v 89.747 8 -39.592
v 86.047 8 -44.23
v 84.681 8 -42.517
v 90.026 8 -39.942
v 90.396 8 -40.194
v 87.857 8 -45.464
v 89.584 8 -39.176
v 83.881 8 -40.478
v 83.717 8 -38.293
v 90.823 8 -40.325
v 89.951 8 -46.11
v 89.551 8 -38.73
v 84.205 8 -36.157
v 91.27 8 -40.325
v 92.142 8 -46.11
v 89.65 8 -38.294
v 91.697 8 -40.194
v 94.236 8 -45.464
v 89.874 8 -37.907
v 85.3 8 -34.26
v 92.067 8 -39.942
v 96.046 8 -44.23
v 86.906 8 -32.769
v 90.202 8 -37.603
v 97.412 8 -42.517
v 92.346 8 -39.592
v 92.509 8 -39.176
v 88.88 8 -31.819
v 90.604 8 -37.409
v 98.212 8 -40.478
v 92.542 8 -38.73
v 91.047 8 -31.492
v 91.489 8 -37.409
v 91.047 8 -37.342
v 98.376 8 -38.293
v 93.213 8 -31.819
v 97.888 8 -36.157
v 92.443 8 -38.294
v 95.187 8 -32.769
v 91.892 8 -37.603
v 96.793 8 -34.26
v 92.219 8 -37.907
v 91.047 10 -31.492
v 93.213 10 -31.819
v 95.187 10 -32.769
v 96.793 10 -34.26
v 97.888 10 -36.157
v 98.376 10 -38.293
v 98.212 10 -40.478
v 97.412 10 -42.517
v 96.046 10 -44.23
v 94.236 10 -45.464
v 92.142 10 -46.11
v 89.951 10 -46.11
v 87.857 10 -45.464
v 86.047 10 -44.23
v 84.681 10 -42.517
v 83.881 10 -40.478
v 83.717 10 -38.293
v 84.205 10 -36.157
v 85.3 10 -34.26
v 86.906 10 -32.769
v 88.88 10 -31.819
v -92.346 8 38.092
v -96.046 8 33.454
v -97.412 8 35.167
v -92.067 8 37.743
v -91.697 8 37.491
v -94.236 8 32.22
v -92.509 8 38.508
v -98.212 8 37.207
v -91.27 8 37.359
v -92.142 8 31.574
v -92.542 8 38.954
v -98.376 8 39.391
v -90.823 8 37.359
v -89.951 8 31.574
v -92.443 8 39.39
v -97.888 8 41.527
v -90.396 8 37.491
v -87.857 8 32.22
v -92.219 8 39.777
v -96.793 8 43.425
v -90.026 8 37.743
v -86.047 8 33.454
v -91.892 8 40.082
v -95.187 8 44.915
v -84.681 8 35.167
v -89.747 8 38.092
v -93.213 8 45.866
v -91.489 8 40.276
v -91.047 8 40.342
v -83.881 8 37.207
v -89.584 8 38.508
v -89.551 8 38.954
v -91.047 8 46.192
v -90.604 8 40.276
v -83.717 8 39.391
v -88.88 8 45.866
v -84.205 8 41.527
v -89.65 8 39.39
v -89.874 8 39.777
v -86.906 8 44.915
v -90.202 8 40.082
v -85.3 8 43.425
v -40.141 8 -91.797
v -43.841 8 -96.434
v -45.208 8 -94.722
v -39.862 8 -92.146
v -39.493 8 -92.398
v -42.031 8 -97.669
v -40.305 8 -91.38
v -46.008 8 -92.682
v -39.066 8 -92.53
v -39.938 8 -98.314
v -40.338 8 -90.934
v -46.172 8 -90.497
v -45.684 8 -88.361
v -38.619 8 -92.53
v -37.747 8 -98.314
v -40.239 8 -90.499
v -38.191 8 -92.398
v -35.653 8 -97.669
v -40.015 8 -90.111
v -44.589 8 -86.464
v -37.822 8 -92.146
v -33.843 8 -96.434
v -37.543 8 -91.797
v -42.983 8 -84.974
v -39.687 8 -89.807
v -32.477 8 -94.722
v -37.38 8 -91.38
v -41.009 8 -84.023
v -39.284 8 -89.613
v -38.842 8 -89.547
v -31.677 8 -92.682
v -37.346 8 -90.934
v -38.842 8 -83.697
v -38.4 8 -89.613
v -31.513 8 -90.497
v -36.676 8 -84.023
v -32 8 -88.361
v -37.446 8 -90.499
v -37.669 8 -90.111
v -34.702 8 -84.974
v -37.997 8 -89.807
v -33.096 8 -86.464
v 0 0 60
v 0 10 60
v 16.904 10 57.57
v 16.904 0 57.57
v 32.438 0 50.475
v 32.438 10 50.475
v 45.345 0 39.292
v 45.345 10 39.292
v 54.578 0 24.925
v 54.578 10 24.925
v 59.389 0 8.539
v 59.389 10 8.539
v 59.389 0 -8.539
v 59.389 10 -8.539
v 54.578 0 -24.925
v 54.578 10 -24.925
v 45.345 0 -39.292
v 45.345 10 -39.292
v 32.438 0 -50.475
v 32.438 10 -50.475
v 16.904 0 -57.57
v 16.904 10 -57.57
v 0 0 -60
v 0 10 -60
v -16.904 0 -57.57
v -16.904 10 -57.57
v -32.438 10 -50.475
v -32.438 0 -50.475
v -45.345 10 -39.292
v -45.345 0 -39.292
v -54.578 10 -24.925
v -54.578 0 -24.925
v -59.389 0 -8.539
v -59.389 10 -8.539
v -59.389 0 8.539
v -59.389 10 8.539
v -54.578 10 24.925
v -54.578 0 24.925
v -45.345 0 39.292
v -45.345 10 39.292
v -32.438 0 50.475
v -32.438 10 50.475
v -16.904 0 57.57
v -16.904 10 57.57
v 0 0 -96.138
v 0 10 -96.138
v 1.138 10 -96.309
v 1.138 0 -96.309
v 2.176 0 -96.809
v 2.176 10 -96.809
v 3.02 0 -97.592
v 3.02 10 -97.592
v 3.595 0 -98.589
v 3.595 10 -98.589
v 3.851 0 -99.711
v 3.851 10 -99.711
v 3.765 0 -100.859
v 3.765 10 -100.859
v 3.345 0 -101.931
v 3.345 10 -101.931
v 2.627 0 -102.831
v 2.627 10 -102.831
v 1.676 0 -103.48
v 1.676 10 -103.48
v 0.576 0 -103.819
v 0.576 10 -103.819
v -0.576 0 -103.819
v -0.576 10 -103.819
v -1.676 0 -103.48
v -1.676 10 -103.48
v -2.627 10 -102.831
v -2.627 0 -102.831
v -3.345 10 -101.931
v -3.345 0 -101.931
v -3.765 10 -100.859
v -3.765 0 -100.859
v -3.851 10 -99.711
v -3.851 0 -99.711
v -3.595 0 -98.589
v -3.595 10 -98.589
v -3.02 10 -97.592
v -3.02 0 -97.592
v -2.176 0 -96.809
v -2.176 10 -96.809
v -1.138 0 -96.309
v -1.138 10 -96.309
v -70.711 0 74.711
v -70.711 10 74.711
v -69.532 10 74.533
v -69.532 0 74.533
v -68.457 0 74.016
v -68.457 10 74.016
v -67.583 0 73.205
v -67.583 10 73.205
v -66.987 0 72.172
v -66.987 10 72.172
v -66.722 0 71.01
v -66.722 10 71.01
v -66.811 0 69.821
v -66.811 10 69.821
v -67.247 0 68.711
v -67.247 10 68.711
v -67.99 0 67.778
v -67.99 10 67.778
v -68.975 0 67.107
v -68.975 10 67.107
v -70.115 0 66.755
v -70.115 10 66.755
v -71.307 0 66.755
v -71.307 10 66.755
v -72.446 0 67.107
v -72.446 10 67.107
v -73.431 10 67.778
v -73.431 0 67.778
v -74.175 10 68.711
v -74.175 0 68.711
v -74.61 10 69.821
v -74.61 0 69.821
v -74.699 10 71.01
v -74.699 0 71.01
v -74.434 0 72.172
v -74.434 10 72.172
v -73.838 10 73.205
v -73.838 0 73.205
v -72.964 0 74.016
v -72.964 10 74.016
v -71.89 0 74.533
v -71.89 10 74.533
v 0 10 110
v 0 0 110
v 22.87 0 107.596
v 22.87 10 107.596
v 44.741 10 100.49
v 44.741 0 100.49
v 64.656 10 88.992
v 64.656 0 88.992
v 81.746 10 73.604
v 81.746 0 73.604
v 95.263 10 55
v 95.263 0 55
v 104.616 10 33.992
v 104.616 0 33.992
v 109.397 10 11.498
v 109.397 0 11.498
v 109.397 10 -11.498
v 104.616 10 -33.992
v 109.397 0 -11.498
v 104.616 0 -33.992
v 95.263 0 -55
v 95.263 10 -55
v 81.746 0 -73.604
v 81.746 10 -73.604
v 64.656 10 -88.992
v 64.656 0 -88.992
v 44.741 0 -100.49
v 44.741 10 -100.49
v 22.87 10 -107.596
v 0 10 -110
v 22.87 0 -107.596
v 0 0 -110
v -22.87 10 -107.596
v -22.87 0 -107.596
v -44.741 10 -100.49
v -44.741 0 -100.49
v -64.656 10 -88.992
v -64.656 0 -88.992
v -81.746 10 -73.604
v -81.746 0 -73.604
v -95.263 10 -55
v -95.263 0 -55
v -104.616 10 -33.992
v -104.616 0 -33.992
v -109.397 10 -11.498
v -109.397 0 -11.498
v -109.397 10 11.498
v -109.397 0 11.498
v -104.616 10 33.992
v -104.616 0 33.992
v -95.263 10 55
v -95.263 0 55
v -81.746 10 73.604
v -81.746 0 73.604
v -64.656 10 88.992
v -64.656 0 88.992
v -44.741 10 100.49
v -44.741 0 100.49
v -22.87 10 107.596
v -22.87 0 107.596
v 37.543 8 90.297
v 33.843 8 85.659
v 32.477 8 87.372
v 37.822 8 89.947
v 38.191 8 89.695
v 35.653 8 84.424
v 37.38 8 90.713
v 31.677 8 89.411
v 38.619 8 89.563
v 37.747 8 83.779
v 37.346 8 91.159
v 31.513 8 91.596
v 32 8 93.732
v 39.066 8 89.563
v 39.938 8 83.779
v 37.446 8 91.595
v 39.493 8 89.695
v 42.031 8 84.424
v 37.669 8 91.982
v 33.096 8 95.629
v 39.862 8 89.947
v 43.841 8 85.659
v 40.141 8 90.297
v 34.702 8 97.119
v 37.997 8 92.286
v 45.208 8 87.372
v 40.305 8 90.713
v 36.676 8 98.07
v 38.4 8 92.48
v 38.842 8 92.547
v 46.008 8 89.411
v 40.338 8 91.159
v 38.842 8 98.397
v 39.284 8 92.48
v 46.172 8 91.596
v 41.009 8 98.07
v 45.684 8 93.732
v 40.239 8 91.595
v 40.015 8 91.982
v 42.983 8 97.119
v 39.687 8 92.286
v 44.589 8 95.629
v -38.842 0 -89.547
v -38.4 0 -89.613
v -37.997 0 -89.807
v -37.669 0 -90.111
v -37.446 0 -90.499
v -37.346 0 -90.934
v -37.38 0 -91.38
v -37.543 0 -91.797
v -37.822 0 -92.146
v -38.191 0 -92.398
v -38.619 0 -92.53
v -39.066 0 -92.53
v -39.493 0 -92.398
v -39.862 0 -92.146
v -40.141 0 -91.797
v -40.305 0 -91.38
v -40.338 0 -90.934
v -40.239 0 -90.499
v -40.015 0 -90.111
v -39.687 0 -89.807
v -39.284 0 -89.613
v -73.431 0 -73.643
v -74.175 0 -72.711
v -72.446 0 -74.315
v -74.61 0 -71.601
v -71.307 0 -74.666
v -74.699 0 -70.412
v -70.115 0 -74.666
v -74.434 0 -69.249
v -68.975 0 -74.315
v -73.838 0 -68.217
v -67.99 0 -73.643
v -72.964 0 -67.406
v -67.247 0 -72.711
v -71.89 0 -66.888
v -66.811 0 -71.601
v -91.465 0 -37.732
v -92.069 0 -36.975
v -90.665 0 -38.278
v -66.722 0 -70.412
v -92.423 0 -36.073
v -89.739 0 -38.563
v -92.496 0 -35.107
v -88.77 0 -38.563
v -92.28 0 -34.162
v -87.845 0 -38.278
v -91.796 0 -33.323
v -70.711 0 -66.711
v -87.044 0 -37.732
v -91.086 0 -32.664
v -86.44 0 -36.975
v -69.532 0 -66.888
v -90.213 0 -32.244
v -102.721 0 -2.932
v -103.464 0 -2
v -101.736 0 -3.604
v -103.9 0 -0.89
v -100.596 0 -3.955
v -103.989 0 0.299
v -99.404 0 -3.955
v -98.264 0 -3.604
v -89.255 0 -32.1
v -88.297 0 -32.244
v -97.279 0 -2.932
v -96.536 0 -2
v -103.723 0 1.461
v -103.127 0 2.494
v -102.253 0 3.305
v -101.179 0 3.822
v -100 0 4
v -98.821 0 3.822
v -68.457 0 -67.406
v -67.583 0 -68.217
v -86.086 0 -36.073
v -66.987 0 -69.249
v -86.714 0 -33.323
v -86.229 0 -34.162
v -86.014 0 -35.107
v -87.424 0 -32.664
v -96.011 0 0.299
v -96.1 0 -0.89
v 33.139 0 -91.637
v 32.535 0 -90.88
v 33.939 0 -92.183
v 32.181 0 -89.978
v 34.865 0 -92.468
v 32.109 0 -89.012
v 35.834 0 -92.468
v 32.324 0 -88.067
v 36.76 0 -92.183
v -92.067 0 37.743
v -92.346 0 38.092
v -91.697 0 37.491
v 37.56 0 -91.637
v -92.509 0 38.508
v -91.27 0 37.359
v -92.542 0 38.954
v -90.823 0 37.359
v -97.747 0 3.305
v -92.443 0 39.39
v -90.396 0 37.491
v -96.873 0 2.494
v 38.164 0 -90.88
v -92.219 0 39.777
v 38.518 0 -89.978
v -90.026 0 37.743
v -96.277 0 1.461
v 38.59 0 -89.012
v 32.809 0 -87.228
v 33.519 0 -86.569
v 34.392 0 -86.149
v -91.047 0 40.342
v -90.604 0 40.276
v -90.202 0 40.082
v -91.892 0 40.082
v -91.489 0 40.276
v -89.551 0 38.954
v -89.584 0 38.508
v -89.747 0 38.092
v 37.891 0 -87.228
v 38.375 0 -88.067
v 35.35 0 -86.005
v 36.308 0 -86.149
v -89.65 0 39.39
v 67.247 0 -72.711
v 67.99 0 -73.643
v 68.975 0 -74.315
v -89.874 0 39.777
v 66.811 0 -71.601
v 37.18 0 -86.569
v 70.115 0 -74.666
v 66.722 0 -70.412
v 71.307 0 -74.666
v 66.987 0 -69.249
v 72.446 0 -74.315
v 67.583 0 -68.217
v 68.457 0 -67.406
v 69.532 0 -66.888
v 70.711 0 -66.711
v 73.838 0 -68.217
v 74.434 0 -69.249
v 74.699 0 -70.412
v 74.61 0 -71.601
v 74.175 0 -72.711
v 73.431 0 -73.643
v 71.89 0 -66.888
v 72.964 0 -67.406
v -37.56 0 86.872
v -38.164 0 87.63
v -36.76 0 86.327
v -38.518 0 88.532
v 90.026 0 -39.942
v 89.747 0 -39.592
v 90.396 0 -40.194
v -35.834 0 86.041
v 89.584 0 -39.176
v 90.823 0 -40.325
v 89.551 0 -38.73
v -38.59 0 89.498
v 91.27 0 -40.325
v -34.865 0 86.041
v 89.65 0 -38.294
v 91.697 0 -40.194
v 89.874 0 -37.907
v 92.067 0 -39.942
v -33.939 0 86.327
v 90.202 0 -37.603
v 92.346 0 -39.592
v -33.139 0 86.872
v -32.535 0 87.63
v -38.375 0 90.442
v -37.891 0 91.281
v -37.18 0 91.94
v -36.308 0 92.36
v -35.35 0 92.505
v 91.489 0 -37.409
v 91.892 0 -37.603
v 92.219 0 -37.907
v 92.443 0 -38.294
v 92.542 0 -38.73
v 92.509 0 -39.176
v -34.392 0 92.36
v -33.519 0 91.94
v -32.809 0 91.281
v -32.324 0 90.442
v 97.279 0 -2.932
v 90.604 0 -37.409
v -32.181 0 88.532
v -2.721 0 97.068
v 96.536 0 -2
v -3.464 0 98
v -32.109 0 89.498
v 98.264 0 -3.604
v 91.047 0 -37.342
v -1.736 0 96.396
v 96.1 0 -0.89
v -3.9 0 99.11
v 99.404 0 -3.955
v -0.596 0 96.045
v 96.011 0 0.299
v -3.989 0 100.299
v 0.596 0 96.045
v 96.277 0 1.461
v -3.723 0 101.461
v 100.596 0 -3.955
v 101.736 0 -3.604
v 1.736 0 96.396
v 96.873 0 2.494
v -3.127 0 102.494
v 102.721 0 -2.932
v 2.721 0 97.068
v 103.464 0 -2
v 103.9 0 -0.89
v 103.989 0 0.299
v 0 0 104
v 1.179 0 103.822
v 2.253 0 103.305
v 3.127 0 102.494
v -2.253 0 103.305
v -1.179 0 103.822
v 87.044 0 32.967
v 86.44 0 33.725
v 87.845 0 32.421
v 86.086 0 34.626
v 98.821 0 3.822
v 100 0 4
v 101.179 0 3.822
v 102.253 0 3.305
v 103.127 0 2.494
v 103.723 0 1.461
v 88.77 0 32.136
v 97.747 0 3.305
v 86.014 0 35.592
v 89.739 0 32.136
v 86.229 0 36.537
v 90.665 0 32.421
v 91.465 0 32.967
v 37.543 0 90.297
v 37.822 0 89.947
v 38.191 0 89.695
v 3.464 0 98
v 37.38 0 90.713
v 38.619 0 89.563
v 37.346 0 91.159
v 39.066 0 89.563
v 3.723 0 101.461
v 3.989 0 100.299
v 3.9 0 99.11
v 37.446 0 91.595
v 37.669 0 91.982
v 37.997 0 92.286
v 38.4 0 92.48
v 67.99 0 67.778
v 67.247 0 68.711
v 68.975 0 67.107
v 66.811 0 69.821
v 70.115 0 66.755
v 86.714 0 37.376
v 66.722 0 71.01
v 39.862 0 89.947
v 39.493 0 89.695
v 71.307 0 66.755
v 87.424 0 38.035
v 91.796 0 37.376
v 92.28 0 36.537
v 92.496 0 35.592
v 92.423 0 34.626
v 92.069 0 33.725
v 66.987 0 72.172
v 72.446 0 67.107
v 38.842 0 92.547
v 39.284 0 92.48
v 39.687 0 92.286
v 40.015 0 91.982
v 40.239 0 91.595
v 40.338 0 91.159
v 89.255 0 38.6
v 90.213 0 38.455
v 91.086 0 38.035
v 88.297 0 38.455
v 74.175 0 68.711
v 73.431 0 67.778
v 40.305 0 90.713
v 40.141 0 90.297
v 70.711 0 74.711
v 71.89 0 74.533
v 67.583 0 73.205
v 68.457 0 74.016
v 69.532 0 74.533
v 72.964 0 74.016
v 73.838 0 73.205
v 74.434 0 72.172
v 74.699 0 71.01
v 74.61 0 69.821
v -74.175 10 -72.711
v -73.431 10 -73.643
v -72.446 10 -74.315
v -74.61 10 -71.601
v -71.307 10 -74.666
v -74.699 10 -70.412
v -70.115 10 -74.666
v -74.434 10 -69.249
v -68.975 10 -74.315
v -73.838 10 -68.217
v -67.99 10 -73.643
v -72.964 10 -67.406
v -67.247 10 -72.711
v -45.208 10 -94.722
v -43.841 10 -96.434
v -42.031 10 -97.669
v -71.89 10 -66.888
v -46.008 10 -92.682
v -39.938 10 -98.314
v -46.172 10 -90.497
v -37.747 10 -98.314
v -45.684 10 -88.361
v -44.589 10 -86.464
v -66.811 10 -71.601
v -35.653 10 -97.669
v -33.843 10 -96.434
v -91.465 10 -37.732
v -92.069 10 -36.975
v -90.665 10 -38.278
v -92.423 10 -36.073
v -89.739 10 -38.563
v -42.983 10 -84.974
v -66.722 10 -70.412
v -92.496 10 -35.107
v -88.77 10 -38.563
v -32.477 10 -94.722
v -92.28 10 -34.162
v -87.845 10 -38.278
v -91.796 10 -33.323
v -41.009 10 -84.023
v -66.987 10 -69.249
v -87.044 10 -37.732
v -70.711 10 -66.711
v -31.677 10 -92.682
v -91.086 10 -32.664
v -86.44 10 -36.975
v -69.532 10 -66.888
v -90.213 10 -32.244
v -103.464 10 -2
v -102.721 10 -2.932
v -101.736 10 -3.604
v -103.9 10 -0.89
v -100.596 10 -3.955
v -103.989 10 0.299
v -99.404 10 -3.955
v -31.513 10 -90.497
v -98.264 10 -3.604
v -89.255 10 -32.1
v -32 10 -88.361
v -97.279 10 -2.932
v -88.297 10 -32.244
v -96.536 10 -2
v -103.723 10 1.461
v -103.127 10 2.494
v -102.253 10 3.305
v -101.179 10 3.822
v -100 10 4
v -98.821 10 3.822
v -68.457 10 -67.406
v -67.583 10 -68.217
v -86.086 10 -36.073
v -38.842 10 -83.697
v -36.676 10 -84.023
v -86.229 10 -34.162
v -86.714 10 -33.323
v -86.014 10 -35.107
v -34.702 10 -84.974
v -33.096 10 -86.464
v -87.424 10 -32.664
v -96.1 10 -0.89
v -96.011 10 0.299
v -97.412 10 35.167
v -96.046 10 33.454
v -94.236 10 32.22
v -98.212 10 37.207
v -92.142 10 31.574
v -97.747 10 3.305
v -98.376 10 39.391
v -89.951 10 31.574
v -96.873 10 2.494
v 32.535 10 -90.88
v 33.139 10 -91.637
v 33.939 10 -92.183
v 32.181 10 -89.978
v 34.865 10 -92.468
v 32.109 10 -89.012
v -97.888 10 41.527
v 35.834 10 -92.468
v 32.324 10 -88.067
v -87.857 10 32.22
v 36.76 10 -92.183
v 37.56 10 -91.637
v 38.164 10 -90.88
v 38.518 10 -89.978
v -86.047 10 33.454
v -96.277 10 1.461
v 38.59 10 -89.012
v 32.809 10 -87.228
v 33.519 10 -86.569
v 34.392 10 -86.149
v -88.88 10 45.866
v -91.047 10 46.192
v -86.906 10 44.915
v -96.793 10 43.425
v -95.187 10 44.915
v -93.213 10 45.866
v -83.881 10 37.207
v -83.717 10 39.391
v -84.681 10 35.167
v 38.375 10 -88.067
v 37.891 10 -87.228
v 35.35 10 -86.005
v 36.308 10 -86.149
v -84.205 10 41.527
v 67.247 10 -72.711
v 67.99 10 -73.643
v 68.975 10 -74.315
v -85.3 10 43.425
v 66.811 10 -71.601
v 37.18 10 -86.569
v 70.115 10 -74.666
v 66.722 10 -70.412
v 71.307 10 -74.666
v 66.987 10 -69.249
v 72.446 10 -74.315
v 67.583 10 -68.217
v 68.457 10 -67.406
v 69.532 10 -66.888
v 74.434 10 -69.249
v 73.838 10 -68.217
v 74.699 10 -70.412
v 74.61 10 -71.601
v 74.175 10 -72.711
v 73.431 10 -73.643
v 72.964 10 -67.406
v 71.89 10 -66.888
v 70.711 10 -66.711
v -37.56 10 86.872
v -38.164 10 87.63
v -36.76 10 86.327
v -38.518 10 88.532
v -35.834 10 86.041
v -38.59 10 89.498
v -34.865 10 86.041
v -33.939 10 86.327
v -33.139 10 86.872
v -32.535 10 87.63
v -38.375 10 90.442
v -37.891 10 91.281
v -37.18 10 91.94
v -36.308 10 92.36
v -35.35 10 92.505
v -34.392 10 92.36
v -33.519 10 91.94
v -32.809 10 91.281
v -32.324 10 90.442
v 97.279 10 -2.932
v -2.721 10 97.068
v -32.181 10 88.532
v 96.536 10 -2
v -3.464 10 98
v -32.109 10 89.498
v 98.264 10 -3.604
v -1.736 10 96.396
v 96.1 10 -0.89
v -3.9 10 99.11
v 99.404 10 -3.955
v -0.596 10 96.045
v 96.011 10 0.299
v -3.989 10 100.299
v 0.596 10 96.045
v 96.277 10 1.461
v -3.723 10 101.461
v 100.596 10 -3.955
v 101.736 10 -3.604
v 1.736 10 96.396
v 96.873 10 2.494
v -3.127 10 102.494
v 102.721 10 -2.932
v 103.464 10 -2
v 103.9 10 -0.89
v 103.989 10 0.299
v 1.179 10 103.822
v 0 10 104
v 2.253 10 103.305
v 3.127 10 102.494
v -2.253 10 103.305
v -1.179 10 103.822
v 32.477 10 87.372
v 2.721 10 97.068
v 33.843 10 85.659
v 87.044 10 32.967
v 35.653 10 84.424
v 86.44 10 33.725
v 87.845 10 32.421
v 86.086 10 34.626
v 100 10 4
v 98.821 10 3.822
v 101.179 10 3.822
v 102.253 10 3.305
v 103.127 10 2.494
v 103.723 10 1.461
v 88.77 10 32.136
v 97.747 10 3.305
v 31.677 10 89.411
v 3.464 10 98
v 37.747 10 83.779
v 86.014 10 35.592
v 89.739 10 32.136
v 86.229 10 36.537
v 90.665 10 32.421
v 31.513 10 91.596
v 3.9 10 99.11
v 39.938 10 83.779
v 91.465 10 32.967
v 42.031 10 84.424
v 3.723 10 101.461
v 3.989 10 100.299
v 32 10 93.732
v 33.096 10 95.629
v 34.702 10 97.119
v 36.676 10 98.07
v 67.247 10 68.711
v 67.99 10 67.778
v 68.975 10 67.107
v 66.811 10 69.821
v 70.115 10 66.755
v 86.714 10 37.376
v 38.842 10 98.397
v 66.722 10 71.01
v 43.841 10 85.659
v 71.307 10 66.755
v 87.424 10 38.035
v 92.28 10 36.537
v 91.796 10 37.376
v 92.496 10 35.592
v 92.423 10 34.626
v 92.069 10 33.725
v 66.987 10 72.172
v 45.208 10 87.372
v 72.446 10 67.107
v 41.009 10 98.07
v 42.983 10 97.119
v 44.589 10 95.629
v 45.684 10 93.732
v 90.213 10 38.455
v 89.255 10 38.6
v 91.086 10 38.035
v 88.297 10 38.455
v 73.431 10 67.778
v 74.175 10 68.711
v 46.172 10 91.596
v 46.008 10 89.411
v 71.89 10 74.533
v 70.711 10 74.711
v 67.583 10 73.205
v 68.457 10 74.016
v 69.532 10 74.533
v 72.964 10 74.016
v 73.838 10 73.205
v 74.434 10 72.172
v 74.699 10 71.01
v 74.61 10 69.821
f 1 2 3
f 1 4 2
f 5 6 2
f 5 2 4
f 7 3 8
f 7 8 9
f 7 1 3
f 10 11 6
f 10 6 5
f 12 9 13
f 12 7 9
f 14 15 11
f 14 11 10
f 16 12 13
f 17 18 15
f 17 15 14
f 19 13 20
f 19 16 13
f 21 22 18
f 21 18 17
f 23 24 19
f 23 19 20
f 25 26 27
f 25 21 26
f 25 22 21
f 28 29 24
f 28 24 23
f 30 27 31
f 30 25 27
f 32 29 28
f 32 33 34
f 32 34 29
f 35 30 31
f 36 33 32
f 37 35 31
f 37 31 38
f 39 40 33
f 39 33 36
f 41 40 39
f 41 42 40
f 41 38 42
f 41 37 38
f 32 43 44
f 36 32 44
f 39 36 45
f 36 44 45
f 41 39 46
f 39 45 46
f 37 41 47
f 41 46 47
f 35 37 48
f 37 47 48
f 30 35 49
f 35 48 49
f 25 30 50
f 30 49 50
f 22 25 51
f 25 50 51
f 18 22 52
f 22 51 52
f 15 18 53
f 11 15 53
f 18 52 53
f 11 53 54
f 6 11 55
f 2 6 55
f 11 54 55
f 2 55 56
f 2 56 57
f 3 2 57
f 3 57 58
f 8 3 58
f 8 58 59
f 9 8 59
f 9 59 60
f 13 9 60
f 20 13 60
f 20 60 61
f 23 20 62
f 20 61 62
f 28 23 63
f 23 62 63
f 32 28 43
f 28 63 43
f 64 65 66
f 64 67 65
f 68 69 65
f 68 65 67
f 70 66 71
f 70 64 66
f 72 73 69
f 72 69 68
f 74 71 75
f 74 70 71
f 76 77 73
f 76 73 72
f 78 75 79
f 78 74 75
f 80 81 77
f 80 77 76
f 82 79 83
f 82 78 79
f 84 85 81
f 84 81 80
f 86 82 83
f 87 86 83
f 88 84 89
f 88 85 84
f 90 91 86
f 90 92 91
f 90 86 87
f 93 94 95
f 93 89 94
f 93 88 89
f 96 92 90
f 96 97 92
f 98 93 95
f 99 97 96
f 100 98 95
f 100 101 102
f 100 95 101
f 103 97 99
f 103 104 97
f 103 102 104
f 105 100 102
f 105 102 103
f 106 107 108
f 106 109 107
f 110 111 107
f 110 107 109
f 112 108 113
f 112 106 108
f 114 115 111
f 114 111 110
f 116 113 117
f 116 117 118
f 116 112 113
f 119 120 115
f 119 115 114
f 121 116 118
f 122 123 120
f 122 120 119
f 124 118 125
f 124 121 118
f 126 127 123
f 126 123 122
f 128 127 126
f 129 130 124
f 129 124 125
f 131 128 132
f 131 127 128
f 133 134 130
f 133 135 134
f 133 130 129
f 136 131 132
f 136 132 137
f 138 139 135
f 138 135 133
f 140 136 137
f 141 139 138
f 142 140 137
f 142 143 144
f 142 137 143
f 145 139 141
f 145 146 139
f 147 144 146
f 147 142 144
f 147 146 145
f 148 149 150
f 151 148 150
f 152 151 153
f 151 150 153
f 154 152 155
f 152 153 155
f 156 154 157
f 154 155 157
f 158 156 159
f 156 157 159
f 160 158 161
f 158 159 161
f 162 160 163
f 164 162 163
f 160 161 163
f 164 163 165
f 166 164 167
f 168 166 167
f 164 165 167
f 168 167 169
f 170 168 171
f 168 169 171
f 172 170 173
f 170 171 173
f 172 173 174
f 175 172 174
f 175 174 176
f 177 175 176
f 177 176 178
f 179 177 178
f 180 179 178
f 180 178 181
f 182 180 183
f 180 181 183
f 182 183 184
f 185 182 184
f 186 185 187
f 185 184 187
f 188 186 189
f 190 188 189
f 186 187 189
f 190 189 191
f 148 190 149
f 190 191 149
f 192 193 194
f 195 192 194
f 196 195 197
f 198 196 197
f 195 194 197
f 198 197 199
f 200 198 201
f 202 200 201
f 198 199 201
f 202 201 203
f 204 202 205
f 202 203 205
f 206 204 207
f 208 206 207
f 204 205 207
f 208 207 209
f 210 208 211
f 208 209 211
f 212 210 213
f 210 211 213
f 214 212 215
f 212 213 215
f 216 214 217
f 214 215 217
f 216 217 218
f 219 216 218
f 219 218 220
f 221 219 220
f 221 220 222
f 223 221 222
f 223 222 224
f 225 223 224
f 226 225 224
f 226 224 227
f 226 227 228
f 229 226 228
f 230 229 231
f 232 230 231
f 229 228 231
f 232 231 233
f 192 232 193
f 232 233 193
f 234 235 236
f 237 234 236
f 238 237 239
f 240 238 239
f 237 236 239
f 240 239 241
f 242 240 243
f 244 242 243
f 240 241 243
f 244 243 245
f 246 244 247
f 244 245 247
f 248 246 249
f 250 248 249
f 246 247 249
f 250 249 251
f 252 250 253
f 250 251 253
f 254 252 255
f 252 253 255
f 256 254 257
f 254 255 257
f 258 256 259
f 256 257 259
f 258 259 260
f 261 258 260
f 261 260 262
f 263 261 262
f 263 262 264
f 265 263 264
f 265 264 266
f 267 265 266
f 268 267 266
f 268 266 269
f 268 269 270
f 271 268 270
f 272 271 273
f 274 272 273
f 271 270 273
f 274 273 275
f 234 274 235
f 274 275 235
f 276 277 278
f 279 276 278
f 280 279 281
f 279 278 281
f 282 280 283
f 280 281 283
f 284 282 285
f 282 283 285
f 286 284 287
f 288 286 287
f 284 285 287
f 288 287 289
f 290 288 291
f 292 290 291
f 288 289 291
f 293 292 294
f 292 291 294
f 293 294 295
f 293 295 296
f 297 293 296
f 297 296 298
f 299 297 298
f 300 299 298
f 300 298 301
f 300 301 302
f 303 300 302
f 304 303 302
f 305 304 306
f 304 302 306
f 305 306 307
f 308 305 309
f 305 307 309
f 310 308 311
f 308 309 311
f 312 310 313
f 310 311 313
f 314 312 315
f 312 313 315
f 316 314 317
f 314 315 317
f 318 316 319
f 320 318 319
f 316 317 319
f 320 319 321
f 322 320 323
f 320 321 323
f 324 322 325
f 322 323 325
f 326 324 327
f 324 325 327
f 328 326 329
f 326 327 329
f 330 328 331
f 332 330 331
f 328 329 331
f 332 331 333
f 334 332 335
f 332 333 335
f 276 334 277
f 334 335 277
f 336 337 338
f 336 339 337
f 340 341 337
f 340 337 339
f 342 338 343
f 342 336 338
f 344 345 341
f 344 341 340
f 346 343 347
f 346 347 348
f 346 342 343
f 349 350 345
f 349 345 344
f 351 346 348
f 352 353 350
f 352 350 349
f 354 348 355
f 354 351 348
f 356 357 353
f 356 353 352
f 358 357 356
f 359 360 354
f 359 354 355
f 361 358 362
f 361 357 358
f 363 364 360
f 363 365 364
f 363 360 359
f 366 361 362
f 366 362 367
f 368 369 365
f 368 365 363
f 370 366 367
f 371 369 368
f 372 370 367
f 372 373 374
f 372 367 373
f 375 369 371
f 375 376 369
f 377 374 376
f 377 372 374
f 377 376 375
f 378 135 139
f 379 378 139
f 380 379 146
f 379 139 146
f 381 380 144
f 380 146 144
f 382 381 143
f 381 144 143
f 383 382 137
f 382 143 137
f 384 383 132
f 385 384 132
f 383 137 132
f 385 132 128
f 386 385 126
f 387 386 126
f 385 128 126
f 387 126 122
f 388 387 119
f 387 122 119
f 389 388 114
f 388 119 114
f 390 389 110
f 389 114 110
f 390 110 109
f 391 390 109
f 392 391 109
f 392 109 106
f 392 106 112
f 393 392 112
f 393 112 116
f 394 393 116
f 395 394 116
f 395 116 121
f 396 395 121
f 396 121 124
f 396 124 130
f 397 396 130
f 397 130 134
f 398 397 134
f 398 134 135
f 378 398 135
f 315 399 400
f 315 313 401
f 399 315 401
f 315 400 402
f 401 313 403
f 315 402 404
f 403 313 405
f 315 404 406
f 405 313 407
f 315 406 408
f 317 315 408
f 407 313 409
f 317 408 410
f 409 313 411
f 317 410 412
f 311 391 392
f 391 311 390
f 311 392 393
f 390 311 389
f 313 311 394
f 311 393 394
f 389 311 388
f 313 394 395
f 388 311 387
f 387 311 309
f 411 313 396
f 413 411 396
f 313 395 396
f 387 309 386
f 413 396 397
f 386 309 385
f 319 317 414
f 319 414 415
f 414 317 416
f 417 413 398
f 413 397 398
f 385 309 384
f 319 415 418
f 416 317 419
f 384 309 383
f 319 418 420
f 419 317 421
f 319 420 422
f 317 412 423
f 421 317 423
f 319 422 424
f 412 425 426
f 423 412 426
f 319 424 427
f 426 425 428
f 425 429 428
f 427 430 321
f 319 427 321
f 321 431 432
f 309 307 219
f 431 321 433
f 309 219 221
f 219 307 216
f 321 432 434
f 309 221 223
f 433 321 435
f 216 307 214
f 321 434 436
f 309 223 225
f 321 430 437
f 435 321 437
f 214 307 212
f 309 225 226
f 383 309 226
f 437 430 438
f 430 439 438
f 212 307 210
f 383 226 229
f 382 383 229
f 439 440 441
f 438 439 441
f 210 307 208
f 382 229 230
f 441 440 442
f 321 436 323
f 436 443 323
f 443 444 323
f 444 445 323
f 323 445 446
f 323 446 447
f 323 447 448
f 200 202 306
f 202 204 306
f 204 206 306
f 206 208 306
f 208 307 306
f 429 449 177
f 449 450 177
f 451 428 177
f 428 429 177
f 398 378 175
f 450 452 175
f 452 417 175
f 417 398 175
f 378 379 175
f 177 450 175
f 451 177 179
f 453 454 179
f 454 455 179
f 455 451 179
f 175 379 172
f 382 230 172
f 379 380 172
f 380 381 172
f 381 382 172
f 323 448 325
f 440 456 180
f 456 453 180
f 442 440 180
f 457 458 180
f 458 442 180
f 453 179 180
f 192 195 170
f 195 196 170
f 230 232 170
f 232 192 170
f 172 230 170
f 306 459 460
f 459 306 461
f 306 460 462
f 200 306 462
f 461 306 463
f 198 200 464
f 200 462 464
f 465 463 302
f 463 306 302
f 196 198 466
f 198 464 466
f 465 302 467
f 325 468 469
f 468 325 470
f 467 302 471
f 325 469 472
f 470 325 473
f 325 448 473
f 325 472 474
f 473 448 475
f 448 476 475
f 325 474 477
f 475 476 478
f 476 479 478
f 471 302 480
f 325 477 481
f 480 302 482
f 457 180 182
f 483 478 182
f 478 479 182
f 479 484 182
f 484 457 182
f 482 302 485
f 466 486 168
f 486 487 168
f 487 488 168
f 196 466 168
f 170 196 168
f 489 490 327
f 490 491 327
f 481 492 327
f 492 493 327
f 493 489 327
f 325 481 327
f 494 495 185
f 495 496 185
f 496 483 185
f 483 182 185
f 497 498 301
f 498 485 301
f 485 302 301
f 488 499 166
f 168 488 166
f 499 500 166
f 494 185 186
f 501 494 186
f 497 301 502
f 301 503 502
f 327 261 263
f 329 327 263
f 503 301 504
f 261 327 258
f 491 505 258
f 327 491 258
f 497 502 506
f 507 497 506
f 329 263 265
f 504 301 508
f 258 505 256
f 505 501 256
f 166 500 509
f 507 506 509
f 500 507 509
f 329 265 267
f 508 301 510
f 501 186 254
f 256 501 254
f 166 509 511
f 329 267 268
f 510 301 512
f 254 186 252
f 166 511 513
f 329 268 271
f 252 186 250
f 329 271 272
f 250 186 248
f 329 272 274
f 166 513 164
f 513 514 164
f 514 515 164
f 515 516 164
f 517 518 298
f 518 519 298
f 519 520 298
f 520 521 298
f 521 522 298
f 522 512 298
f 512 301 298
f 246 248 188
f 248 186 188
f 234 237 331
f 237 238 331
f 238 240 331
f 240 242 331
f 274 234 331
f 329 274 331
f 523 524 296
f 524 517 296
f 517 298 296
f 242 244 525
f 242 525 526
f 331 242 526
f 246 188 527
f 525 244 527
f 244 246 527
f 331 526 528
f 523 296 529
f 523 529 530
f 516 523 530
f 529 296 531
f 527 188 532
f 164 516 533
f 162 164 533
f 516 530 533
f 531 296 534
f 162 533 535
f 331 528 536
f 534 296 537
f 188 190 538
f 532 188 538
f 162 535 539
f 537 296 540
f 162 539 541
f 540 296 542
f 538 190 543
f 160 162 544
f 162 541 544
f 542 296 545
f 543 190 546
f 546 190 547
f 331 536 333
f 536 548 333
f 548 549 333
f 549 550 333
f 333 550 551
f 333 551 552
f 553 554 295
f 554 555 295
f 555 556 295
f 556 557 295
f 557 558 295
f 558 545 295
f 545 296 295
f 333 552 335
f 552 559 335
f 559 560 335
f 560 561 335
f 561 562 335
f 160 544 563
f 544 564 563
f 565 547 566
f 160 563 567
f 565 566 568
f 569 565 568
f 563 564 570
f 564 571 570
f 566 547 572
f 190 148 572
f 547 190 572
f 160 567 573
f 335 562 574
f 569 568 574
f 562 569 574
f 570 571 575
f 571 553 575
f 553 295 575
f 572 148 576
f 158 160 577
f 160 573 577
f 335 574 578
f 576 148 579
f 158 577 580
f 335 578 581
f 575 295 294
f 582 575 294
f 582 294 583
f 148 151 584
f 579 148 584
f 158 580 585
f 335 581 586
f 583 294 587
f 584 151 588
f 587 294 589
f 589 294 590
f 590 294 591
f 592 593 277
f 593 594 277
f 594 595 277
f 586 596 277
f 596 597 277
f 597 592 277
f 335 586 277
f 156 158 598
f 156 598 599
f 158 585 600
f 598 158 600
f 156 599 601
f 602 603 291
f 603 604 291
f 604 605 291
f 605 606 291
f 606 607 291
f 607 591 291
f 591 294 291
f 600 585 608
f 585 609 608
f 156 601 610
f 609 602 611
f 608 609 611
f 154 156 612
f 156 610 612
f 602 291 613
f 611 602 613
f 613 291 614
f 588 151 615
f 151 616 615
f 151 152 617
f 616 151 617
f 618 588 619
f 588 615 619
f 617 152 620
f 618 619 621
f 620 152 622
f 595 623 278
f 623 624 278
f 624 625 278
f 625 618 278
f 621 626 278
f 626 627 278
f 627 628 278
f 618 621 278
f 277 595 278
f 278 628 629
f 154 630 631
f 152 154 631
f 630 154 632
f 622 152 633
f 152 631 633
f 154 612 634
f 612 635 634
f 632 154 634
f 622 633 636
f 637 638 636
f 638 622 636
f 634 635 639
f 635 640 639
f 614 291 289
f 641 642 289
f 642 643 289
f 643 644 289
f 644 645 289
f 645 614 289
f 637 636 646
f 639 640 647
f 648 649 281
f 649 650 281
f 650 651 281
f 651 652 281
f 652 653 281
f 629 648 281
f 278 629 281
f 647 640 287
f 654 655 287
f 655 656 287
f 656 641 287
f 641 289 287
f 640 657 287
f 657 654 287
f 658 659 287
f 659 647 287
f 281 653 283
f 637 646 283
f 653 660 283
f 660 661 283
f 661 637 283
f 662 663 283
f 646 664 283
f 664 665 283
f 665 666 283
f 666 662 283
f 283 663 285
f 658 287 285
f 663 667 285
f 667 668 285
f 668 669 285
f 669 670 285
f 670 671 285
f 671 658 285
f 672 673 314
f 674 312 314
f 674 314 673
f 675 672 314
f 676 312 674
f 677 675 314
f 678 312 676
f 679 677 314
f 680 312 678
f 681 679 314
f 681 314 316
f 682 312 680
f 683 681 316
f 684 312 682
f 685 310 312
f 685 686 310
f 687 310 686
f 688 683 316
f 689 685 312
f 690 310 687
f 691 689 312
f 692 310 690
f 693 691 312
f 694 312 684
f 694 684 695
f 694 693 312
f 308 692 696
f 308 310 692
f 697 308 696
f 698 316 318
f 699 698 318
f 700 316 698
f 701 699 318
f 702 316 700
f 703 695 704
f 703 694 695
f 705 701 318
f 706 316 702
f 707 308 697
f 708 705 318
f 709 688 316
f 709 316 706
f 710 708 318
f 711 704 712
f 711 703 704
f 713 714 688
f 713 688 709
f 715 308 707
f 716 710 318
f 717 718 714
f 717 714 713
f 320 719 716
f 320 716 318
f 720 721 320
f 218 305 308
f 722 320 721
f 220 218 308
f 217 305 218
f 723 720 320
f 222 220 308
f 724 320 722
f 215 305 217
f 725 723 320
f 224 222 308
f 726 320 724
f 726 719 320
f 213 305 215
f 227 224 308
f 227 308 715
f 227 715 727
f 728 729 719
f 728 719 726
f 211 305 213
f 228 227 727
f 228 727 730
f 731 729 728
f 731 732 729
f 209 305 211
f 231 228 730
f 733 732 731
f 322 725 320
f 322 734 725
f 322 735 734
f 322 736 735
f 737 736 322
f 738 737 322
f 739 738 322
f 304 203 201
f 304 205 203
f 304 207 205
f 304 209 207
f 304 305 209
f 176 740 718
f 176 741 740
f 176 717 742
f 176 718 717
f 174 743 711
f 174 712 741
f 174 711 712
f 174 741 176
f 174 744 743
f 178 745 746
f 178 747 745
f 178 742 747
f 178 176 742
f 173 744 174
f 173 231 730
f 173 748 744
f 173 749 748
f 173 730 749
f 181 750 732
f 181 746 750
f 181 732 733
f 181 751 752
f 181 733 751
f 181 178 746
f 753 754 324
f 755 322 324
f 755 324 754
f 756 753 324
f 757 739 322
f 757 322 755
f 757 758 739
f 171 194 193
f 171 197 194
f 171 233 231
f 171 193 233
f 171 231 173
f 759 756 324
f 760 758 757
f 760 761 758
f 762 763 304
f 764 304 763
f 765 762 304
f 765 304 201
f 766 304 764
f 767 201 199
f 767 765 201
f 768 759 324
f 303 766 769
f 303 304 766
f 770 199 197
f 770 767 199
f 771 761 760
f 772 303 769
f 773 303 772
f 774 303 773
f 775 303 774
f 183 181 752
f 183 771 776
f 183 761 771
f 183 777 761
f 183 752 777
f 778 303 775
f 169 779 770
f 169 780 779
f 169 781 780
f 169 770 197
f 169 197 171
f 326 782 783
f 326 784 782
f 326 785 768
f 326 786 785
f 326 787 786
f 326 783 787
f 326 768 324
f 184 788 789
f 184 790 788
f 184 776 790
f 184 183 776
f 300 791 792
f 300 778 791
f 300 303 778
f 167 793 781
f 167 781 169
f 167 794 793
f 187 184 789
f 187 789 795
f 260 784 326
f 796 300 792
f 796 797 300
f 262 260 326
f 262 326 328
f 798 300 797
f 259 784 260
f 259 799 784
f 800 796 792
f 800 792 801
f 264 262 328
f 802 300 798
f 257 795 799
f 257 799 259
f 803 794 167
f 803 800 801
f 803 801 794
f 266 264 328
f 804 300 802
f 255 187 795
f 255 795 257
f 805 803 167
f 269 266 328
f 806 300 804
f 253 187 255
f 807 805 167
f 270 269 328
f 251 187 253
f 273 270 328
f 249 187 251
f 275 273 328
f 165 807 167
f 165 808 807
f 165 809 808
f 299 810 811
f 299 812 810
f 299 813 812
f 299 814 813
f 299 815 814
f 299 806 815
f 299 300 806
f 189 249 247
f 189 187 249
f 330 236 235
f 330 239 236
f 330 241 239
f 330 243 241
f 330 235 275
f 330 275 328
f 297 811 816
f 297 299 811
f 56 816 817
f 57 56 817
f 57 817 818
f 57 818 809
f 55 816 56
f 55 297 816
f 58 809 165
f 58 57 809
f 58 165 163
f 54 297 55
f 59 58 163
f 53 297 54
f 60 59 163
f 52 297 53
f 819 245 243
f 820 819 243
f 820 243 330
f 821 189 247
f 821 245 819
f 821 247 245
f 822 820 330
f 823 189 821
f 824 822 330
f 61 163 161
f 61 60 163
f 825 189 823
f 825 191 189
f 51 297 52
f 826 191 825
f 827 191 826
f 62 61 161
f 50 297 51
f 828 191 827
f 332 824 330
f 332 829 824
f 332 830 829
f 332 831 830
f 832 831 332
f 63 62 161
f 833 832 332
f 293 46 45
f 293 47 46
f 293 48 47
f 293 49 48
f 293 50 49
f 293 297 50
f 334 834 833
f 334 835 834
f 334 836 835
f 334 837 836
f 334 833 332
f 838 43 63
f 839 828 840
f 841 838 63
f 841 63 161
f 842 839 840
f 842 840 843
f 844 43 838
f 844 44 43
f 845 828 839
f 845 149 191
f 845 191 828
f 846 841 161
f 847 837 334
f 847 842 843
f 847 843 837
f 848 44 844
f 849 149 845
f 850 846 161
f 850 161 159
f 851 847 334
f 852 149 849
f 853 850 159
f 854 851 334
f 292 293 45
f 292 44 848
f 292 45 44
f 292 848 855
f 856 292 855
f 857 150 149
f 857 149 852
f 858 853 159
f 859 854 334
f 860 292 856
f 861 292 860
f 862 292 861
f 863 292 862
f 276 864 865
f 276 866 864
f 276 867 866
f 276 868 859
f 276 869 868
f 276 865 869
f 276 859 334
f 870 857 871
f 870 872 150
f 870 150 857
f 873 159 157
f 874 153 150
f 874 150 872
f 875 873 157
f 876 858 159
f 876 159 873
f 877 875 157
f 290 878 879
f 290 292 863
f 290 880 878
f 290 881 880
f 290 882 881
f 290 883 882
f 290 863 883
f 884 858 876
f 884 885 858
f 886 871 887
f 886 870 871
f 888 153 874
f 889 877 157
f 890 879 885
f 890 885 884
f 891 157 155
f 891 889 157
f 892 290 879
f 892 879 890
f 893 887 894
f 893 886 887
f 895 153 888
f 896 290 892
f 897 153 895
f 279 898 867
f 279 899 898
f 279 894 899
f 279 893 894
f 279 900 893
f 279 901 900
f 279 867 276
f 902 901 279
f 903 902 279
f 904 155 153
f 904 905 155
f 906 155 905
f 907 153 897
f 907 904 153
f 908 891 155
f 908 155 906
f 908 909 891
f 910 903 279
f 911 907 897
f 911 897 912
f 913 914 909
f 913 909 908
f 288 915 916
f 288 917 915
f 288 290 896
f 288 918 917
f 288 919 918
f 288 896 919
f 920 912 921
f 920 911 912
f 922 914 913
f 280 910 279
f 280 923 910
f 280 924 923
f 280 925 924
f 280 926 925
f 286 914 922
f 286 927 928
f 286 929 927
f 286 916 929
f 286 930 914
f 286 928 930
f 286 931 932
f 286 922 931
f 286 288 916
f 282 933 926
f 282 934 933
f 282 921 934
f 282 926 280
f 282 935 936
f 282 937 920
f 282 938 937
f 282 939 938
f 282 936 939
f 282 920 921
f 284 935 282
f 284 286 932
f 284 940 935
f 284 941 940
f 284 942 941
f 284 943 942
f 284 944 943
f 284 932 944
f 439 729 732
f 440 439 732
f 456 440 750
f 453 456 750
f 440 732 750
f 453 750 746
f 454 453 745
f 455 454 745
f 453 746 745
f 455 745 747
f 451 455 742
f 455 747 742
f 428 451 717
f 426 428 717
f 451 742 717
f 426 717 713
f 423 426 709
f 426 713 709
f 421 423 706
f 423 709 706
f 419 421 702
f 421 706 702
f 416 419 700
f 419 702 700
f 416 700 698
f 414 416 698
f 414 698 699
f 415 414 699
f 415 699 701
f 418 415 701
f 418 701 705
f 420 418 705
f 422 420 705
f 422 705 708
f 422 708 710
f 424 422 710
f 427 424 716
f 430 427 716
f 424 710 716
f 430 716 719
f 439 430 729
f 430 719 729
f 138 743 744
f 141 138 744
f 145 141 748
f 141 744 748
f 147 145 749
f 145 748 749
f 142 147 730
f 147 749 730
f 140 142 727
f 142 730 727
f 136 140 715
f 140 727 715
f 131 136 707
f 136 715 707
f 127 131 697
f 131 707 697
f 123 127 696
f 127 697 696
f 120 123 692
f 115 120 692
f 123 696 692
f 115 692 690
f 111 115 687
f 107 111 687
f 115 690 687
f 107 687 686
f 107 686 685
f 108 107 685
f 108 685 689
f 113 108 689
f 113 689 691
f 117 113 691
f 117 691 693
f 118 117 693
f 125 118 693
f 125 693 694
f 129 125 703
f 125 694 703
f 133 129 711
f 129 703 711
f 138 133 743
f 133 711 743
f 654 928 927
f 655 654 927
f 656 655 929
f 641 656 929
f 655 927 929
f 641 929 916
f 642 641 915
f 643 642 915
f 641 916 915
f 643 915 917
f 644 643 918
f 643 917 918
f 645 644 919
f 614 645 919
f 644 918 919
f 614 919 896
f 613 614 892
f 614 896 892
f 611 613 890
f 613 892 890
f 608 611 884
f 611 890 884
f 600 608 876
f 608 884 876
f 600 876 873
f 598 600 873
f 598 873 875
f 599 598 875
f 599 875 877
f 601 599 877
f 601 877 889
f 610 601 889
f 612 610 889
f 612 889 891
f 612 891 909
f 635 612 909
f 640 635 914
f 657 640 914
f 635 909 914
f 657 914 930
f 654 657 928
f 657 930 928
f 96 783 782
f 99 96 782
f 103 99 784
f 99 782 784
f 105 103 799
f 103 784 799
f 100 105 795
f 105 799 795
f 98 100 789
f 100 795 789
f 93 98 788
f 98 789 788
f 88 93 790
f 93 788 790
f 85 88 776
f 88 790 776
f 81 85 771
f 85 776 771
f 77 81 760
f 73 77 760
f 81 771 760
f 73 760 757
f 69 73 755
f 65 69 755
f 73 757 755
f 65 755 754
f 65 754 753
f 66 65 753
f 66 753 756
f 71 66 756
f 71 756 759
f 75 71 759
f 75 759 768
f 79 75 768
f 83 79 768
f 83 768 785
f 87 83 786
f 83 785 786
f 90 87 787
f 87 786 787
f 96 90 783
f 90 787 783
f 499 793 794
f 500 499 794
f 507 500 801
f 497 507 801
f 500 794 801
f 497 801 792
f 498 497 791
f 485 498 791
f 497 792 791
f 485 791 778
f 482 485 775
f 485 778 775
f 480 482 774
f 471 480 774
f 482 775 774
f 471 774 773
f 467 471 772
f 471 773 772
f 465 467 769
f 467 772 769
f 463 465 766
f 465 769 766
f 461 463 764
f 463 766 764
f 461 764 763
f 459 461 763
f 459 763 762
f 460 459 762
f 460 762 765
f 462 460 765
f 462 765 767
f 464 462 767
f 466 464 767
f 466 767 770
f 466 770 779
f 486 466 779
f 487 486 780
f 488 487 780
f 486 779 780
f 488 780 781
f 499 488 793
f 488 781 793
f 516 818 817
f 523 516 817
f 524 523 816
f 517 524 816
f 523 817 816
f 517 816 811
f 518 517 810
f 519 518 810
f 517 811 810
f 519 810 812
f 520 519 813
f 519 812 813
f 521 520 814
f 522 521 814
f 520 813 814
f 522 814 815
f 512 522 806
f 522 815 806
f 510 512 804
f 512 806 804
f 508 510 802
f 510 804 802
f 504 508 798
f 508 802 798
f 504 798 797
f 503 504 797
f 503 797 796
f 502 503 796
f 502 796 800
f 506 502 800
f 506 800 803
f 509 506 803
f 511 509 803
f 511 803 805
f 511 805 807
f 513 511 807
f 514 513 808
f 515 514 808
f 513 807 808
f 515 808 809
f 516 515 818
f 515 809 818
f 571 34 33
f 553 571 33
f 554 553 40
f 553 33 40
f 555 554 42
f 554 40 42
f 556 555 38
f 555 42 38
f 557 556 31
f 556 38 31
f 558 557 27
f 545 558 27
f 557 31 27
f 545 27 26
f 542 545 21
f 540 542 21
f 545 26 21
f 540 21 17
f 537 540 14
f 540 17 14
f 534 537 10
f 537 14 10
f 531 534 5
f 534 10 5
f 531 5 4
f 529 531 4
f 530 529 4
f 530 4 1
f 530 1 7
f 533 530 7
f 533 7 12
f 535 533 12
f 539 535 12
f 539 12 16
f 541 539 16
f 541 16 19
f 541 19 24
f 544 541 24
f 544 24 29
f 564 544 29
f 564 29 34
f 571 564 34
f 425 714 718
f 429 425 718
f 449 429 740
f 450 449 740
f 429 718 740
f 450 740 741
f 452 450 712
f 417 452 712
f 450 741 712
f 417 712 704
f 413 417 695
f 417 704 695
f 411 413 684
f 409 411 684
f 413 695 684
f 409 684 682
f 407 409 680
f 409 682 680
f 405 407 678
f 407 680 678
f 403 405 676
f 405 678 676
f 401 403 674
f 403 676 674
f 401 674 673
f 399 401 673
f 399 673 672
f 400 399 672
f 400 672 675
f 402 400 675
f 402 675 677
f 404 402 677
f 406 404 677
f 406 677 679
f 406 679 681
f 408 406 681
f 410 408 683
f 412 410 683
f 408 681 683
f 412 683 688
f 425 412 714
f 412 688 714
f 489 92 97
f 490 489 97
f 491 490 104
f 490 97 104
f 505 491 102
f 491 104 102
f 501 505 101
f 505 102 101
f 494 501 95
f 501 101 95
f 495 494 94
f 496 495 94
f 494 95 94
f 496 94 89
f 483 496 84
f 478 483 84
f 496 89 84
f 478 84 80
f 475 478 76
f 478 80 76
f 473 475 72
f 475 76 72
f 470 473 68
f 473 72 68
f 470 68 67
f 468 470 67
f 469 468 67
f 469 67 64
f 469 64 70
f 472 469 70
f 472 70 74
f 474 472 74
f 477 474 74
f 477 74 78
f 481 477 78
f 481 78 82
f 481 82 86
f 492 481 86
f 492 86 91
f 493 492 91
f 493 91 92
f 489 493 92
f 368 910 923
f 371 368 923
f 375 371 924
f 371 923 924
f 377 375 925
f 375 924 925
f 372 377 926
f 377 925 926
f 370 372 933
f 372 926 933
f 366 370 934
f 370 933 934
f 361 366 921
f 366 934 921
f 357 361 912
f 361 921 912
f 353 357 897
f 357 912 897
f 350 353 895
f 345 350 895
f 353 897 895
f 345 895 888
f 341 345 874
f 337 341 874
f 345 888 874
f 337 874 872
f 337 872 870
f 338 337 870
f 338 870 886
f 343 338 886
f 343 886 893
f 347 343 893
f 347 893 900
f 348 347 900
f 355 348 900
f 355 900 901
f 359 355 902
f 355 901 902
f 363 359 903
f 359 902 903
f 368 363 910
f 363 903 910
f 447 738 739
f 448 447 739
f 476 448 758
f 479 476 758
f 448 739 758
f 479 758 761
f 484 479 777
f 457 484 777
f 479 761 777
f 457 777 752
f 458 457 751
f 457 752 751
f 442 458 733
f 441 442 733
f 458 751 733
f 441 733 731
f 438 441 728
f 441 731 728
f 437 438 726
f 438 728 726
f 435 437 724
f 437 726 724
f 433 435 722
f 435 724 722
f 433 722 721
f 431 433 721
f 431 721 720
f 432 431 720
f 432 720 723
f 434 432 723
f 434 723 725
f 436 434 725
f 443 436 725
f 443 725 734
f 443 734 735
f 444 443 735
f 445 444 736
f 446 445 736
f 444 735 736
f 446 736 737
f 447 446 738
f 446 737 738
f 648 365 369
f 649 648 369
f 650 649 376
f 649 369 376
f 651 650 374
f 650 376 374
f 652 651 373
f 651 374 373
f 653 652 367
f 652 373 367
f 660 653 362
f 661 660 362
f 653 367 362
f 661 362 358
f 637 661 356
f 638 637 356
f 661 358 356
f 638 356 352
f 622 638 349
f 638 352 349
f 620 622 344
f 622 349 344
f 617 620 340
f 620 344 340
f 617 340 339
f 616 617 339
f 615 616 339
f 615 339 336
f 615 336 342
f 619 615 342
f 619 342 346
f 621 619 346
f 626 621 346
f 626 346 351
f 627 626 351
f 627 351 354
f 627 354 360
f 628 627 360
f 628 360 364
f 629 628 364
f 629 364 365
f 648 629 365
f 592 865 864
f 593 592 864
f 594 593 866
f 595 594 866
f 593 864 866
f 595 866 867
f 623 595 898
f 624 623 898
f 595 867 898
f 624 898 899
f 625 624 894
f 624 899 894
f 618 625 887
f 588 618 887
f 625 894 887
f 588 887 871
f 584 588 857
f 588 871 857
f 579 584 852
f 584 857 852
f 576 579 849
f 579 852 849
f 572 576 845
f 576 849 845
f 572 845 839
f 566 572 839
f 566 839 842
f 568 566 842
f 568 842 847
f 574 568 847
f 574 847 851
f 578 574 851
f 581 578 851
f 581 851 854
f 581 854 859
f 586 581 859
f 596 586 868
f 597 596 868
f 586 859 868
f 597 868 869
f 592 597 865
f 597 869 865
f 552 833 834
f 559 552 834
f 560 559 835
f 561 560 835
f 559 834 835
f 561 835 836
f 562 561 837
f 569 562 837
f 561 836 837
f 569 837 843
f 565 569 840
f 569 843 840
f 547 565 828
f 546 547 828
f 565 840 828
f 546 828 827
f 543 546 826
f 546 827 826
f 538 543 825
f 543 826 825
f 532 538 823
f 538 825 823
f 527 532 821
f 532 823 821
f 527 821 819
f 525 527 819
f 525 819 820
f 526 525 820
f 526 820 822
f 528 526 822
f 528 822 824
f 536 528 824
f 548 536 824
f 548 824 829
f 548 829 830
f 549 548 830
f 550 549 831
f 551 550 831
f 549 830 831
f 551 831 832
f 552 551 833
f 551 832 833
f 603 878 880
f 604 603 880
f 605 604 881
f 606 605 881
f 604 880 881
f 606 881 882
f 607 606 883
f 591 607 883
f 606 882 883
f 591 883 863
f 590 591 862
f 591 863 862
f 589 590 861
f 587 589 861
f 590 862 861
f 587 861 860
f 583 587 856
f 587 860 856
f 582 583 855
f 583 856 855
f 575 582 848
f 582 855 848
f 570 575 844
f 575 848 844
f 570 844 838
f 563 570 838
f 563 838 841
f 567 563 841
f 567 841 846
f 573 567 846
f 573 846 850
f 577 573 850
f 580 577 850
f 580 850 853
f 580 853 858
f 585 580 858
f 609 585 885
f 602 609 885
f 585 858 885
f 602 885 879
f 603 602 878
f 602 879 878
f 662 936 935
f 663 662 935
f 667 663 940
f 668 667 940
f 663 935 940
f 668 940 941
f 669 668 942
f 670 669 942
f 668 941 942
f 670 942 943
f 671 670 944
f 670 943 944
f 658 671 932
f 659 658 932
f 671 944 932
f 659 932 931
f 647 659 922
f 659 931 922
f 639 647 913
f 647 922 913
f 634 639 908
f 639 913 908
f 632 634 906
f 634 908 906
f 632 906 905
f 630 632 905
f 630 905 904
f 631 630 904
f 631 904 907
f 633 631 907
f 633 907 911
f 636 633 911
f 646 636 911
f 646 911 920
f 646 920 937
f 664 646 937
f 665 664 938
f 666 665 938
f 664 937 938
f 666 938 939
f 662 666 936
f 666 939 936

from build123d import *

# Parameters (mm, degrees)
CROQUIS1_R              = 110
SALIENTE_EXTRUIR1_DEPTH = 10
CROQUIS2_R              = 3.862102747
CROQUIS2_R_2            = 4
CORTAR_EXTRUIR1_DEPTH   = 10
CROQUIS3_R              = 60
CORTAR_EXTRUIR2_DEPTH   = 10
CROQUIS4_R              = 3.25
CORTAR_EXTRUIR3_DEPTH   = 10
CROQUIS5_R              = 7.35
CORTAR_EXTRUIR4_DEPTH   = 2
CROQUIS7_R              = 1.5
CORTAR_EXTRUIR5_DEPTH   = 10


with BuildPart() as part:
    # Croquis1 → Saliente-Extruir1 (new body)
    with BuildSketch(Plane(origin=(0, 0, 0), x_dir=(1, 0, 0), z_dir=(0, 1, 0))):
        with Locations(Location((0, 0, 0), (0, 0, 270))):
            Circle(CROQUIS1_R)
    extrude(amount=SALIENTE_EXTRUIR1_DEPTH)

    # Croquis2 → Cortar-Extruir1 (cut)
    with BuildSketch(Plane(origin=(0, 10, 0), x_dir=(1, 0, 0), z_dir=(0, 1, 0))):
        with Locations(Location((0, 100, 0), (0, 0, 270))):
            Circle(CROQUIS2_R)
        with Locations(Location((-100, 0, 0), (0, 0, 270))):
            Circle(CROQUIS2_R_2)
        with Locations(Location((0, -100, 0), (0, 0, 270))):
            Circle(CROQUIS2_R_2)
        with Locations(Location((100, 0, 0), (0, 0, 270))):
            Circle(CROQUIS2_R_2)
        with Locations(Location((-70.710678119, 70.710678119, 0), (0, 0, 270))):
            Circle(CROQUIS2_R_2)
        with Locations(Location((70.710678119, 70.710678119, 0), (0, 0, 270))):
            Circle(CROQUIS2_R_2)
        with Locations(Location((70.710678119, -70.710678119, 0), (0, 0, 270))):
            Circle(CROQUIS2_R_2)
        with Locations(Location((-70.710678119, -70.710678119, 0), (0, 0, 270))):
            Circle(CROQUIS2_R_2)
    extrude(amount=-CORTAR_EXTRUIR1_DEPTH, mode=Mode.SUBTRACT)

    # Croquis3 → Cortar-Extruir2 (cut)
    with BuildSketch(Plane(origin=(0, 10, 0), x_dir=(1, 0, 0), z_dir=(0, 1, 0))):
        with Locations(Location((0, 0, 0), (0, 0, 270))):
            Circle(CROQUIS3_R)
    extrude(amount=-CORTAR_EXTRUIR2_DEPTH, mode=Mode.SUBTRACT)

    # Croquis4 → Cortar-Extruir3 (cut)
    with BuildSketch(Plane(origin=(0, 10, 0), x_dir=(1, 0, 0), z_dir=(0, 1, 0))):
        with Locations(Location((89.254735783, -35.349570581, 0), (0, 0, 270))):
            Circle(CROQUIS4_R)
        with Locations(Location((-35.349570581, -89.254735783, 0), (0, 0, 270))):
            Circle(CROQUIS4_R)
        with Locations(Location((-89.254735783, 35.349570581, 0), (0, 0, 270))):
            Circle(CROQUIS4_R)
        with Locations(Location((35.349570581, 89.254735783, 0), (0, 0, 270))):
            Circle(CROQUIS4_R)
    extrude(amount=-CORTAR_EXTRUIR3_DEPTH, mode=Mode.SUBTRACT)

    # Croquis5 → Cortar-Extruir4 (cut)
    with BuildSketch(Plane(origin=(0, 10, 0), x_dir=(1, 0, 0), z_dir=(0, 1, 0))):
        with Locations(Location((91.046524442, 38.842229875, 0), (0, 0, 270))):
            Circle(CROQUIS5_R)
        with Locations(Location((38.842229875, -91.046524442, 0), (0, 0, 270))):
            Circle(CROQUIS5_R)
        with Locations(Location((-91.046524442, -38.842229875, 0), (0, 0, 270))):
            Circle(CROQUIS5_R)
        with Locations(Location((-38.842229875, 91.046524442, 0), (0, 0, 270))):
            Circle(CROQUIS5_R)
    extrude(amount=-CORTAR_EXTRUIR4_DEPTH, mode=Mode.SUBTRACT)

    # Croquis7 → Cortar-Extruir5 (cut)
    with BuildSketch(Plane(origin=(0, 10, 0), x_dir=(1, 0, 0), z_dir=(0, 1, 0))):
        with Locations(Location((-38.842229875, 91.046524442, 0), (0, 0, 270))):
            Circle(CROQUIS7_R)
        with Locations(Location((91.046524442, 38.842229875, 0), (0, 0, 270))):
            Circle(CROQUIS7_R)
        with Locations(Location((38.842229875, -91.046524442, 0), (0, 0, 270))):
            Circle(CROQUIS7_R)
        with Locations(Location((-91.046524442, -38.842229875, 0), (0, 0, 270))):
            Circle(CROQUIS7_R)
    extrude(amount=-CORTAR_EXTRUIR5_DEPTH, mode=Mode.SUBTRACT)


solid = part.part
